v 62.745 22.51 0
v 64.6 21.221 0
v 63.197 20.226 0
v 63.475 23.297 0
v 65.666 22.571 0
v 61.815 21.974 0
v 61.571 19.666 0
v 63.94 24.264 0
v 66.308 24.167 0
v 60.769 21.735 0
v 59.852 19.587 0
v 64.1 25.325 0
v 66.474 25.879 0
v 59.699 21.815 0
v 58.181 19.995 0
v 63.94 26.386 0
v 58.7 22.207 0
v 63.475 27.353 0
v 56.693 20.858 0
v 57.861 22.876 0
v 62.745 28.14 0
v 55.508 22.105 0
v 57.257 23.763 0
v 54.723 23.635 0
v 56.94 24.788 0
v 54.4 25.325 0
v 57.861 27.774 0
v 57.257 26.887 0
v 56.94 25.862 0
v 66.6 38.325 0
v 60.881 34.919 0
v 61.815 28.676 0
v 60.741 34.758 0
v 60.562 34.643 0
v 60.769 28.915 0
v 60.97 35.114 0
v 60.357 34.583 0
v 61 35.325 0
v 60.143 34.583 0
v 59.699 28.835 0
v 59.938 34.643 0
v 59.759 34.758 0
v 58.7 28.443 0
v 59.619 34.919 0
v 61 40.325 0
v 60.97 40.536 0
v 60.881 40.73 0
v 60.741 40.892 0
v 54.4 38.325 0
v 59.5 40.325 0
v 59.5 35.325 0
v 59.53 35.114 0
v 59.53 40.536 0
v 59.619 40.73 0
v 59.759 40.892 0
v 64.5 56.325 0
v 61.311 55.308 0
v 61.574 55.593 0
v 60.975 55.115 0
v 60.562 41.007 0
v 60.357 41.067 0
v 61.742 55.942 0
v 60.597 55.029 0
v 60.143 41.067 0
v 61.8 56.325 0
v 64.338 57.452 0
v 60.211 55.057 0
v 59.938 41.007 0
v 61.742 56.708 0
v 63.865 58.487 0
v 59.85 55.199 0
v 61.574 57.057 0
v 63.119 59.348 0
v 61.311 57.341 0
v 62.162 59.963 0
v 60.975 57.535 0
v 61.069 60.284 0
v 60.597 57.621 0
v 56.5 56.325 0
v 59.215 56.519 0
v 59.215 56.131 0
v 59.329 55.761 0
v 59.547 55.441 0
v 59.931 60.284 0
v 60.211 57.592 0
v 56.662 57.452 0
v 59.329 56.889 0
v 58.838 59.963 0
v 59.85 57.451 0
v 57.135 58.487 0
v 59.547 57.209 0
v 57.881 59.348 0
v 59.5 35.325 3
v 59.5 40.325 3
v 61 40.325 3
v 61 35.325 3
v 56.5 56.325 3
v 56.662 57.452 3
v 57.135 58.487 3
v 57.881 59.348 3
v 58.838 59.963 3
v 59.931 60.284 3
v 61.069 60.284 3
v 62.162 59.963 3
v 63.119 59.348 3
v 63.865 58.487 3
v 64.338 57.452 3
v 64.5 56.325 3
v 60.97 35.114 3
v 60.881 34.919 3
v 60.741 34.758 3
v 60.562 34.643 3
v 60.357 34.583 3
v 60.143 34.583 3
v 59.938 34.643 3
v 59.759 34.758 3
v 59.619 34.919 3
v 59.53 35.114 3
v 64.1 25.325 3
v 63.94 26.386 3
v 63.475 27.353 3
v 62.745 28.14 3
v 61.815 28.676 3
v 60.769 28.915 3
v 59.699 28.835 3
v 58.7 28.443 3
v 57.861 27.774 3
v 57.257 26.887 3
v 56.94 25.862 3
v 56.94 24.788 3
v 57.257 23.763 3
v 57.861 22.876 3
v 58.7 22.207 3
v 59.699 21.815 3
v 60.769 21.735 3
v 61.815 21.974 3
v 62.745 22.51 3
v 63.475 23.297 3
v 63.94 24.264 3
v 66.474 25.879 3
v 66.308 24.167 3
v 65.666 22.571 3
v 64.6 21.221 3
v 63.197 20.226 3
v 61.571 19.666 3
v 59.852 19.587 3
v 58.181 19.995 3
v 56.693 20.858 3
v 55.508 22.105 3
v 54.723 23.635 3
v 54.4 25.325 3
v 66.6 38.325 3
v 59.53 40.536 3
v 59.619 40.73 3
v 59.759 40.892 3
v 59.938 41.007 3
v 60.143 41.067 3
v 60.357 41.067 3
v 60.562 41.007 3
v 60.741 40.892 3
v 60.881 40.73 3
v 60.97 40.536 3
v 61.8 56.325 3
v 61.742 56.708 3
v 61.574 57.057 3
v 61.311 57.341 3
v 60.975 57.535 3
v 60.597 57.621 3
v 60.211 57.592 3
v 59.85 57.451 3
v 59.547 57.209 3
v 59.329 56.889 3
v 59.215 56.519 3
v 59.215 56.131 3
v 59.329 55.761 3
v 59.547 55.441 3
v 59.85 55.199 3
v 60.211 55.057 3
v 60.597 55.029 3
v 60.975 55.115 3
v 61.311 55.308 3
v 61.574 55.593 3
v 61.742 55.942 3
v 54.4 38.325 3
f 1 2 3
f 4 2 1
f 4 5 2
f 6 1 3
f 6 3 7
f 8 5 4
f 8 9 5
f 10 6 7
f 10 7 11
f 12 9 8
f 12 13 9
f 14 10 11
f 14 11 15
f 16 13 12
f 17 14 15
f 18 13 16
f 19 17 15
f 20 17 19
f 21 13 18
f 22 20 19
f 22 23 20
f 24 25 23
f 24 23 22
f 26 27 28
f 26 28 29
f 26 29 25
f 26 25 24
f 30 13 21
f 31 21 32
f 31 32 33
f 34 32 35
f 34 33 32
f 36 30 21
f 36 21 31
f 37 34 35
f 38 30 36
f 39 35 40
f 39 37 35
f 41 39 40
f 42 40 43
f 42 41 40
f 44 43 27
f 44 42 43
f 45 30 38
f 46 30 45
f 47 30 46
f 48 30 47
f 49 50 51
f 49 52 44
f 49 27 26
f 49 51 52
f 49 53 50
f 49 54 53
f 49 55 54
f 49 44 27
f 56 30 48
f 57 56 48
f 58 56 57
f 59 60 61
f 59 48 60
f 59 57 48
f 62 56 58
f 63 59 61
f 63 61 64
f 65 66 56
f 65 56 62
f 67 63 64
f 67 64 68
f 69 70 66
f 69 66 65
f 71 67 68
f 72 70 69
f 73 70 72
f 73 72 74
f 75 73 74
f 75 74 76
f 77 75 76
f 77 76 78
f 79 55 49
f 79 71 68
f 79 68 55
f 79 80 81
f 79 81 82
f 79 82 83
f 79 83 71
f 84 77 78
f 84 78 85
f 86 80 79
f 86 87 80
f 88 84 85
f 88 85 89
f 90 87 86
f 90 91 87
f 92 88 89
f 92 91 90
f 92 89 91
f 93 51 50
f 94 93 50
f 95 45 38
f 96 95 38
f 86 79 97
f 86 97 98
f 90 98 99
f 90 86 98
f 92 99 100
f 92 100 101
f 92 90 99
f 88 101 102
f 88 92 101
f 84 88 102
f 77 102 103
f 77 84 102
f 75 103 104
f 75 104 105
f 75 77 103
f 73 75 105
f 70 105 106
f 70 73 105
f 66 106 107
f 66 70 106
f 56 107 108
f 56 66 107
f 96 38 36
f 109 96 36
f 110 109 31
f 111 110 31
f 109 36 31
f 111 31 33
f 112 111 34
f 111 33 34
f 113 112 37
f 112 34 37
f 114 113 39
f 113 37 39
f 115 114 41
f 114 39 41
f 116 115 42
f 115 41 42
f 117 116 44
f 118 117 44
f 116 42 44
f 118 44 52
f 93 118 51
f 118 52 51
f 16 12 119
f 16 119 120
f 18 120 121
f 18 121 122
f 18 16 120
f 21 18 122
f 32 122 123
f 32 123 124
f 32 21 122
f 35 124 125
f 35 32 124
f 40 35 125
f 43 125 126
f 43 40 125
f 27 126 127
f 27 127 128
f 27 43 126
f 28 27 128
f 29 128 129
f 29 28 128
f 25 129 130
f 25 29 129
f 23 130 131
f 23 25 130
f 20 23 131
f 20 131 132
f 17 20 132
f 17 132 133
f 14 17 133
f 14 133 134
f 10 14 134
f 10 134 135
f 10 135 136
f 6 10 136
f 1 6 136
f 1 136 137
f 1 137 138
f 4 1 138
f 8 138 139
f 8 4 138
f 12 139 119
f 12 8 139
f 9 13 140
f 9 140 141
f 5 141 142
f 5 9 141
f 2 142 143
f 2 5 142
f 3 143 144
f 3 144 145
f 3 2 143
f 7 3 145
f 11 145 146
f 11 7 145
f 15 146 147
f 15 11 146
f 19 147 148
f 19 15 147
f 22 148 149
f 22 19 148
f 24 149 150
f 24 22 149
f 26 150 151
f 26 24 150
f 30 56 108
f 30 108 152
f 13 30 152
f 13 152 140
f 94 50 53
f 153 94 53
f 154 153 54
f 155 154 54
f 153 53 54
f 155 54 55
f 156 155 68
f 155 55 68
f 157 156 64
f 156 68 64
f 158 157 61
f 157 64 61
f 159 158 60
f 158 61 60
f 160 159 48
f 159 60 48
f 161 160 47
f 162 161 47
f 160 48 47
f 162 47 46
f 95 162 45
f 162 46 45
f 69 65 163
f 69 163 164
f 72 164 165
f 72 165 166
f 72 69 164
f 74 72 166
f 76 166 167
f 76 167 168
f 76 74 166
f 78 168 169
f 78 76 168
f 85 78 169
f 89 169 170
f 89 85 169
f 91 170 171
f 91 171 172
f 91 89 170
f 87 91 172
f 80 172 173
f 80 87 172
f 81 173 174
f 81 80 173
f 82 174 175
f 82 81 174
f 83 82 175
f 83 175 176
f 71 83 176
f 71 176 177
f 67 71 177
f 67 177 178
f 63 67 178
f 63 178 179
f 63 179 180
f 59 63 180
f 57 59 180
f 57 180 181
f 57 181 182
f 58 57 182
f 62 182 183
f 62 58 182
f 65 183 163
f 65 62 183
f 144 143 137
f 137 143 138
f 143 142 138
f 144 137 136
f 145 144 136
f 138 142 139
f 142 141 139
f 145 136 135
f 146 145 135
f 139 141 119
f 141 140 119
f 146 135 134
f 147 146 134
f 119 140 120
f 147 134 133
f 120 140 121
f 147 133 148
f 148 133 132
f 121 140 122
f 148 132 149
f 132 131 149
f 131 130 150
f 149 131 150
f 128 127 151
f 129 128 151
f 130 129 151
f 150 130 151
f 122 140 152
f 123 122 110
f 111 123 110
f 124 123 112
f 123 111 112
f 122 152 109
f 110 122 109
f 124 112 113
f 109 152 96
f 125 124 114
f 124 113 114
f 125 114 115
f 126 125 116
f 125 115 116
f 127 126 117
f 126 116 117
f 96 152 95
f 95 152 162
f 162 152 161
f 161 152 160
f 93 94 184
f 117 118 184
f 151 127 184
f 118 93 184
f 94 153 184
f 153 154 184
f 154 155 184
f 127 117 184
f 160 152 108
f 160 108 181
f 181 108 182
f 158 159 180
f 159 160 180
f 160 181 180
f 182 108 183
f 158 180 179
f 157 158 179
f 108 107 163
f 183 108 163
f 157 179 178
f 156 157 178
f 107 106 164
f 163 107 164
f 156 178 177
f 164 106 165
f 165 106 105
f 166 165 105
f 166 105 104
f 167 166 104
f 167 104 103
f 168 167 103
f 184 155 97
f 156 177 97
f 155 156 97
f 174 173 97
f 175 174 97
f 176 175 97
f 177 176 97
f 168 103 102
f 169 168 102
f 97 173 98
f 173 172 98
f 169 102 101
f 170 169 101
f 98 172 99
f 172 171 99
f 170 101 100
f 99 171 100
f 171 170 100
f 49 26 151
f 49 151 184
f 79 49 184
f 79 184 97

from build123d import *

# Parameters (mm, degrees)
MODEL_R             = 1.3
MODEL_R_2           = 3.6
BOSS_EXTRUDE1_DEPTH = 3


with BuildPart() as part:
    # Model → Boss-Extrude1 (new body)
    with BuildSketch(Plane.XY):
        with BuildLine():
            Line((54.4, 32.324975002), (54.4, 38.324975002))
            Line((54.4, 38.324975002), (56.5, 56.324876617))
            ThreePointArc((56.5, 56.324876617), (60.5, 60.324876617), (64.5, 56.324876617))
            Line((64.5, 56.324876617), (66.6, 38.324975002))
            Line((66.6, 38.324975002), (66.474361825, 25.879137217))
            ThreePointArc((66.474361825, 25.879137217), (60.71426202, 19.564875197), (54.4, 25.324975002))
            Line((54.4, 25.324975002), (54.4, 32.324975002))
        make_face()
        with Locations((60.5, 56.324876617)):
            Circle(MODEL_R, mode=Mode.SUBTRACT)
        with Locations((60.50005, 25.324984722)):
            Circle(MODEL_R_2, mode=Mode.SUBTRACT)
        with BuildLine():
            Line((59.5, 35.324934722), (59.5, 40.324934722))
            ThreePointArc((59.5, 40.324934722), (60.25, 41.074934722), (61, 40.324934722))
            Line((61, 40.324934722), (61, 35.324934722))
            ThreePointArc((61, 35.324934722), (60.25, 34.574934722), (59.5, 35.324934722))
        make_face(mode=Mode.SUBTRACT)
    extrude(amount=BOSS_EXTRUDE1_DEPTH)


solid = part.part
